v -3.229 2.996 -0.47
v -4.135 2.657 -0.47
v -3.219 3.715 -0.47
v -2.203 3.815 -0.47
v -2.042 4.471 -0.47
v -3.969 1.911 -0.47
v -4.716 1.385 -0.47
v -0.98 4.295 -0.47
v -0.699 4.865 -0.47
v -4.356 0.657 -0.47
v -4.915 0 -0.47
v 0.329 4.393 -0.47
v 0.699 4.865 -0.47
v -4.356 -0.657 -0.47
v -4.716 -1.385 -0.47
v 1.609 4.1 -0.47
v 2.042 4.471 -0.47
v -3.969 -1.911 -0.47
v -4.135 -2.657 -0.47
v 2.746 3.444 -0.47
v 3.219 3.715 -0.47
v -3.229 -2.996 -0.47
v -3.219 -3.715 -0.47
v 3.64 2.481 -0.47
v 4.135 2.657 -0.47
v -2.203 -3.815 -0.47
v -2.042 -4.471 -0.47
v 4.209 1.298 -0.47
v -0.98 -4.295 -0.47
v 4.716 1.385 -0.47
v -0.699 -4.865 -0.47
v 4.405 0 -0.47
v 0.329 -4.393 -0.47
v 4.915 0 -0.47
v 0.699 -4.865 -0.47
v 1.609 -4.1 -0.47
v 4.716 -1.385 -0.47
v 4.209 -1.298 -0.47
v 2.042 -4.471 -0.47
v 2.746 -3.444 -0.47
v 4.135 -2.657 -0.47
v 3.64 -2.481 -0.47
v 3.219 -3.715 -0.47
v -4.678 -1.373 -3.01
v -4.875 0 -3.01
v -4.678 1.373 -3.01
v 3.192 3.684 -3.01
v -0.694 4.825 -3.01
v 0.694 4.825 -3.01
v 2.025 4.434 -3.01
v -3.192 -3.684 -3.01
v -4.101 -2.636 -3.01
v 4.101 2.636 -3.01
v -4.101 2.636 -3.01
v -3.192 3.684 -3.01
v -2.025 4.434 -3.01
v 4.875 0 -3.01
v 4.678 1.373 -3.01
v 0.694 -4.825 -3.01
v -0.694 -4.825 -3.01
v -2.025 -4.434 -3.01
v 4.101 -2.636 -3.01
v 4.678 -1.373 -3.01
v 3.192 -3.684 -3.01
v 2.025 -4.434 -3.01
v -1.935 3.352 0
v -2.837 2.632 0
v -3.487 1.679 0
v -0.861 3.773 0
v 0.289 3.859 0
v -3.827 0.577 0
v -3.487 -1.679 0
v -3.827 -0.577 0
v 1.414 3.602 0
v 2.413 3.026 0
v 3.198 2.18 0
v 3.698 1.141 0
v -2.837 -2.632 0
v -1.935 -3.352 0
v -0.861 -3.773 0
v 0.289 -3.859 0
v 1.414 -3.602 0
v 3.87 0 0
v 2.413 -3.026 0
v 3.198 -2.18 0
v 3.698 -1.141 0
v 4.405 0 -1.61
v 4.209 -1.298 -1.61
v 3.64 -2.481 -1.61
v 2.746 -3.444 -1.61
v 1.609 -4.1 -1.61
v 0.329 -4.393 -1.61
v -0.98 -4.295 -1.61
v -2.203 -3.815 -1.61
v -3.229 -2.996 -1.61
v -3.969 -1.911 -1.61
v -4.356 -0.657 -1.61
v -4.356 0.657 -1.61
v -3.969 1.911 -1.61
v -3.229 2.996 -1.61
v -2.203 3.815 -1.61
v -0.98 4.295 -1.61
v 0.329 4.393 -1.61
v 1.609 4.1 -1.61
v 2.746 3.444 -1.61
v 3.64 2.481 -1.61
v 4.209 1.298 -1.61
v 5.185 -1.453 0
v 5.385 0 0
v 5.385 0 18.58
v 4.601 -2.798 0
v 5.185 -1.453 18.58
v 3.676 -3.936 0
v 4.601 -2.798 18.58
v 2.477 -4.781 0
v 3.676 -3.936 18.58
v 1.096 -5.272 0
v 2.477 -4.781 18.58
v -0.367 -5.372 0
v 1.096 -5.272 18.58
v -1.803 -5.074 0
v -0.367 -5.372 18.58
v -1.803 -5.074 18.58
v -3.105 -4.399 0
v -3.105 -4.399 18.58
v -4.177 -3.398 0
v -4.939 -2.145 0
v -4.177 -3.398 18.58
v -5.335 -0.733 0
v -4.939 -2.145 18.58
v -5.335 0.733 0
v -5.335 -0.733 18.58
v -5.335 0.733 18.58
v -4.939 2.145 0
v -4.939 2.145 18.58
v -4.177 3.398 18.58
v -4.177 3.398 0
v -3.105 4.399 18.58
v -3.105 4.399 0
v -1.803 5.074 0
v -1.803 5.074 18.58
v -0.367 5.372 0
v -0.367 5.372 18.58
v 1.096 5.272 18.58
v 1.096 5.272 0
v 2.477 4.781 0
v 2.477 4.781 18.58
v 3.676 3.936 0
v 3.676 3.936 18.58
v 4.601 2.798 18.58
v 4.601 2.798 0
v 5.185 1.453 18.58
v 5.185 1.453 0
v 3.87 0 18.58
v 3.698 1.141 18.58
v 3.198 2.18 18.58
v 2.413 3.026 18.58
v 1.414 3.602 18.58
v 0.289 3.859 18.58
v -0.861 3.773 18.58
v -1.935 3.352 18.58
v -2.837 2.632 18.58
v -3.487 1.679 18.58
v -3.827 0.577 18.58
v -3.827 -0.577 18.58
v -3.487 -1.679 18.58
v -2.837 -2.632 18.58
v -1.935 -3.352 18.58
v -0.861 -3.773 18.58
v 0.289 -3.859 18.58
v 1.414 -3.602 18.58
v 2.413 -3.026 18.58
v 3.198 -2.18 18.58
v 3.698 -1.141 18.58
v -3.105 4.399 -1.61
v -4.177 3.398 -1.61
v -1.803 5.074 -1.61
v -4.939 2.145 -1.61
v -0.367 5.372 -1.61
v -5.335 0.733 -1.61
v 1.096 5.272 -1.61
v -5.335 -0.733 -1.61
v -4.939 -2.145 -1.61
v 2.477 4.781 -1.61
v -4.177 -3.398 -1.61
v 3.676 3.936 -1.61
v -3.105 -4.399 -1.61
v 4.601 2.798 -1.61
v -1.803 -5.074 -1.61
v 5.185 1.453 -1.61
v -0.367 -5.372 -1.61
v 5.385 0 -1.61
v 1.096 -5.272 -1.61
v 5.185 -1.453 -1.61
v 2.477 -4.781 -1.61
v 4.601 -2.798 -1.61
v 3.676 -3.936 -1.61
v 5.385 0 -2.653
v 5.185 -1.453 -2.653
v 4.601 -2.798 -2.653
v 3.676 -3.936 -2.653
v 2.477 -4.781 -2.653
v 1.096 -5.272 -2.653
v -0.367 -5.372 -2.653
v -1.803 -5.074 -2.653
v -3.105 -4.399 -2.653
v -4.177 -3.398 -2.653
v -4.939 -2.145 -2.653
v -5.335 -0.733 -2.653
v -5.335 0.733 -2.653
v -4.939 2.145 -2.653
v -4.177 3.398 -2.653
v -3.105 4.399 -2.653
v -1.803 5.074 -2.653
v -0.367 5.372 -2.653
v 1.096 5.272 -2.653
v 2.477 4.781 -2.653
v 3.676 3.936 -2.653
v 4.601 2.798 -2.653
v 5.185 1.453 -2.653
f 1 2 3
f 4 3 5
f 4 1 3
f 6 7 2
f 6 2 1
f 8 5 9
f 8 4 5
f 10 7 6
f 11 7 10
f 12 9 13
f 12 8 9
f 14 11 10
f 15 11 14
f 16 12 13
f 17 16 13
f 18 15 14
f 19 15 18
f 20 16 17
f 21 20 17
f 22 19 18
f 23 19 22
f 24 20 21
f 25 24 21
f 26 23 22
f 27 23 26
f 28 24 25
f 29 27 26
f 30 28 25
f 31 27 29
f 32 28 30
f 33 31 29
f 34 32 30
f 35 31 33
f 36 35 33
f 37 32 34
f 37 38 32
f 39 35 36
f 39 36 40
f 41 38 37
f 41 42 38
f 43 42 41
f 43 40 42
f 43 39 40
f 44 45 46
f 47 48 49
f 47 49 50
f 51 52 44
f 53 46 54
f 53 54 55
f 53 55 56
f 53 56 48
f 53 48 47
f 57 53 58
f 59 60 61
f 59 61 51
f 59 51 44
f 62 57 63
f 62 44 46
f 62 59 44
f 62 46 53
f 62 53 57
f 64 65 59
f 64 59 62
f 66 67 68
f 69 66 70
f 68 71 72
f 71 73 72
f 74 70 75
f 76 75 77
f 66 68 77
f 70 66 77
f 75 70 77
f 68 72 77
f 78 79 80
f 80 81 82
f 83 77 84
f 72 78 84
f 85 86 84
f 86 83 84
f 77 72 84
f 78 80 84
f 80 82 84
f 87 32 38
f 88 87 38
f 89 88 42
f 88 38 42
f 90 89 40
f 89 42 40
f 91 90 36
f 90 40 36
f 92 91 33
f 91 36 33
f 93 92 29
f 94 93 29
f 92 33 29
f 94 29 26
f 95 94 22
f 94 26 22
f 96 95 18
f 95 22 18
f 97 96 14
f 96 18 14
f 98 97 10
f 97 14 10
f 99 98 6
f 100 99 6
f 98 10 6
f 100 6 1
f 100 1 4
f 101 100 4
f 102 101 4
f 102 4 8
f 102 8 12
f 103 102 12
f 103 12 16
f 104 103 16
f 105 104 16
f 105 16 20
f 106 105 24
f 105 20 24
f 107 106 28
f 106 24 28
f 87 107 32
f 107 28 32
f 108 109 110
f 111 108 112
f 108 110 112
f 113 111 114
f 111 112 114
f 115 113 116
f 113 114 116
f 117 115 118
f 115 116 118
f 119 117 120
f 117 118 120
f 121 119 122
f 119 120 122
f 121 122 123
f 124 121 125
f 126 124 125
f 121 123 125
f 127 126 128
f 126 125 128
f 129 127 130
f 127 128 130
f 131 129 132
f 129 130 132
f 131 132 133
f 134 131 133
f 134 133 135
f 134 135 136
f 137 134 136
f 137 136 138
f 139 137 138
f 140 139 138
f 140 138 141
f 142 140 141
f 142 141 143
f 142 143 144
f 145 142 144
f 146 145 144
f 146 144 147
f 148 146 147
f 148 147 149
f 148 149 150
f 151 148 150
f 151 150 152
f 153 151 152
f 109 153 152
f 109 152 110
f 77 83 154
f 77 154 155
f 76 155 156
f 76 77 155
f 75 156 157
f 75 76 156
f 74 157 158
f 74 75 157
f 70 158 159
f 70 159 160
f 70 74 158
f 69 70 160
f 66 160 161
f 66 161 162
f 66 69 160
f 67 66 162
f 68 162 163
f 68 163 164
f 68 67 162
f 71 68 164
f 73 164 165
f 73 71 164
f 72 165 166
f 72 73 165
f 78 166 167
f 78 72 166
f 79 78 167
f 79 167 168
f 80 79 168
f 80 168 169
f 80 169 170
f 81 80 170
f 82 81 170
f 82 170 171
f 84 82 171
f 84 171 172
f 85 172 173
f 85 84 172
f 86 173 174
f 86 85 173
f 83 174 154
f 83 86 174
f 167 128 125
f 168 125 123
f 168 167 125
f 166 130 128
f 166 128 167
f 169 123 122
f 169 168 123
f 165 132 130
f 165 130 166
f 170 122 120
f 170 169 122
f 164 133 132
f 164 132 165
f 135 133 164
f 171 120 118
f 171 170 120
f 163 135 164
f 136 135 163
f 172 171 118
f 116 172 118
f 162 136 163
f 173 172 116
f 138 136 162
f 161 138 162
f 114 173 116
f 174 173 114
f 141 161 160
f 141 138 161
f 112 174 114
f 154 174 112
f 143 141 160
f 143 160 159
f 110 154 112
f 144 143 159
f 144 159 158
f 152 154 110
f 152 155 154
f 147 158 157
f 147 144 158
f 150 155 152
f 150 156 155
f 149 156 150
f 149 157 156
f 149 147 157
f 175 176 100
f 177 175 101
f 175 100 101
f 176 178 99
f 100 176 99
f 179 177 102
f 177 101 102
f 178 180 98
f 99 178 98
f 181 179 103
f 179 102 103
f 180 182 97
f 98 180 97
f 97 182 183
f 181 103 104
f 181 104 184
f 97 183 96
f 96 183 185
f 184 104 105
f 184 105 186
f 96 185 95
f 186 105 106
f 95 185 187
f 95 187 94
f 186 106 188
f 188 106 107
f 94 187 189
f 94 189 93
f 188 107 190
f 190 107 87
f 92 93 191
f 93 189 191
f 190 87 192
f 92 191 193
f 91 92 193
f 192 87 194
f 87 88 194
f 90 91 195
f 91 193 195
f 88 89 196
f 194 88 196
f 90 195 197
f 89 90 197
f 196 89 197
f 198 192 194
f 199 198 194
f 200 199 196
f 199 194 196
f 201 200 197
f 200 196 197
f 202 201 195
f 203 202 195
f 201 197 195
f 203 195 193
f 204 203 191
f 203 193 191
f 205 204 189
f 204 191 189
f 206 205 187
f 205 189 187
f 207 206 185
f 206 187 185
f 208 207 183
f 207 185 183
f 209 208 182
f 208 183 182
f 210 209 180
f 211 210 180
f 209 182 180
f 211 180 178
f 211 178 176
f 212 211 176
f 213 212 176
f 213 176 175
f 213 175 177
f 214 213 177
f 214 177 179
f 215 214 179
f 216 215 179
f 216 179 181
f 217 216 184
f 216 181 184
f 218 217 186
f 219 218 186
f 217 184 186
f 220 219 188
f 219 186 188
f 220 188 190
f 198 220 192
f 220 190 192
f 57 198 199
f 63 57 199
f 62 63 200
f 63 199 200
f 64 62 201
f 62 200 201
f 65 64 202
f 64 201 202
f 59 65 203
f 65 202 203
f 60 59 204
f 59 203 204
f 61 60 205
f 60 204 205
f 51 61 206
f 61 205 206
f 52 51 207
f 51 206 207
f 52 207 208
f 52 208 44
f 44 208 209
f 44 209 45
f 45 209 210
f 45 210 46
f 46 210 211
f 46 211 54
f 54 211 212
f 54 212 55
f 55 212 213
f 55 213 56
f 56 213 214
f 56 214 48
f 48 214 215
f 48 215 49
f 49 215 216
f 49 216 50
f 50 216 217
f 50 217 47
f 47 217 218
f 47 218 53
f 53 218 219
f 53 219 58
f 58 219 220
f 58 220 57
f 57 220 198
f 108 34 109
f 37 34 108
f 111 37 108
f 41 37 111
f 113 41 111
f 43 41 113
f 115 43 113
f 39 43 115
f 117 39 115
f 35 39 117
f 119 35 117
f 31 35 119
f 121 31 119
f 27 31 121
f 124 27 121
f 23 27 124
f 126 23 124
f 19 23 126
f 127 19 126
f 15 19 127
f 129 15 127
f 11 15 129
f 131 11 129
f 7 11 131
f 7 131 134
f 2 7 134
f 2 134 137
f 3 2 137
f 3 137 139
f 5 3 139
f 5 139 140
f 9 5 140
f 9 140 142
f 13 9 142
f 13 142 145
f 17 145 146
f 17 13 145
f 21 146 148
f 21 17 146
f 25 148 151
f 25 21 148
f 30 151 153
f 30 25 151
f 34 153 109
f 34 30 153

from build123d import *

# Parameters (mm, degrees)
F0_R     = 5.385
F0_R_2   = 3.87
F1_DEPTH = 18.58
F2_R     = 5.385
F3_DEPTH = 0.47
F4_SIZE2 = 0.47
F4_SIZE  = 0.47
F5_R     = 4.405
F6_DEPTH = 1.14
F7_R     = 5.385
F8_DEPTH = 1.4
F9_SIZE2 = 0.3571058445
F9_SIZE  = 0.51


with BuildPart() as f1:
    # F0 (on Top) → F1 (new body)
    with BuildSketch(Plane.XY):
        Circle(F0_R)
        Circle(F0_R_2, mode=Mode.SUBTRACT)
    extrude(amount=F1_DEPTH)

    # F2 (on face) → F3 (join)
    with BuildSketch(Plane(origin=(0, 0, 0), x_dir=(1, 0, 0), z_dir=(0, 0, -1))):
        Circle(F2_R)
    extrude(amount=F3_DEPTH)

    # F4
    f4_edges = [f1.edges().sort_by_distance(p)[0] for p in [
        (-5.385, 0, -0.47),
    ]]
    chamfer(f4_edges, length=F4_SIZE, length2=F4_SIZE2)

    # F5 (on face) → F6 (join)
    with BuildSketch(Plane(origin=(0, 0, -0.47), x_dir=(1, 0, 0), z_dir=(0, 0, -1))):
        Circle(F5_R)
    extrude(amount=F6_DEPTH)

    # F7 (on face) → F8 (join)
    with BuildSketch(Plane(origin=(0, 0, -1.61), x_dir=(1, 0, 0), z_dir=(0, 0, -1))):
        Circle(F7_R)
    extrude(amount=F8_DEPTH)

    # F9
    f9_edges = [f1.edges().sort_by_distance(p)[0] for p in [
        (-5.385, 0, -3.01),
    ]]
    f9_side = f1.faces().sort_by_distance((0, 0, -3.01))[0]
    chamfer(f9_edges, length=F9_SIZE, length2=F9_SIZE2, reference=f9_side)


solid = f1.part
